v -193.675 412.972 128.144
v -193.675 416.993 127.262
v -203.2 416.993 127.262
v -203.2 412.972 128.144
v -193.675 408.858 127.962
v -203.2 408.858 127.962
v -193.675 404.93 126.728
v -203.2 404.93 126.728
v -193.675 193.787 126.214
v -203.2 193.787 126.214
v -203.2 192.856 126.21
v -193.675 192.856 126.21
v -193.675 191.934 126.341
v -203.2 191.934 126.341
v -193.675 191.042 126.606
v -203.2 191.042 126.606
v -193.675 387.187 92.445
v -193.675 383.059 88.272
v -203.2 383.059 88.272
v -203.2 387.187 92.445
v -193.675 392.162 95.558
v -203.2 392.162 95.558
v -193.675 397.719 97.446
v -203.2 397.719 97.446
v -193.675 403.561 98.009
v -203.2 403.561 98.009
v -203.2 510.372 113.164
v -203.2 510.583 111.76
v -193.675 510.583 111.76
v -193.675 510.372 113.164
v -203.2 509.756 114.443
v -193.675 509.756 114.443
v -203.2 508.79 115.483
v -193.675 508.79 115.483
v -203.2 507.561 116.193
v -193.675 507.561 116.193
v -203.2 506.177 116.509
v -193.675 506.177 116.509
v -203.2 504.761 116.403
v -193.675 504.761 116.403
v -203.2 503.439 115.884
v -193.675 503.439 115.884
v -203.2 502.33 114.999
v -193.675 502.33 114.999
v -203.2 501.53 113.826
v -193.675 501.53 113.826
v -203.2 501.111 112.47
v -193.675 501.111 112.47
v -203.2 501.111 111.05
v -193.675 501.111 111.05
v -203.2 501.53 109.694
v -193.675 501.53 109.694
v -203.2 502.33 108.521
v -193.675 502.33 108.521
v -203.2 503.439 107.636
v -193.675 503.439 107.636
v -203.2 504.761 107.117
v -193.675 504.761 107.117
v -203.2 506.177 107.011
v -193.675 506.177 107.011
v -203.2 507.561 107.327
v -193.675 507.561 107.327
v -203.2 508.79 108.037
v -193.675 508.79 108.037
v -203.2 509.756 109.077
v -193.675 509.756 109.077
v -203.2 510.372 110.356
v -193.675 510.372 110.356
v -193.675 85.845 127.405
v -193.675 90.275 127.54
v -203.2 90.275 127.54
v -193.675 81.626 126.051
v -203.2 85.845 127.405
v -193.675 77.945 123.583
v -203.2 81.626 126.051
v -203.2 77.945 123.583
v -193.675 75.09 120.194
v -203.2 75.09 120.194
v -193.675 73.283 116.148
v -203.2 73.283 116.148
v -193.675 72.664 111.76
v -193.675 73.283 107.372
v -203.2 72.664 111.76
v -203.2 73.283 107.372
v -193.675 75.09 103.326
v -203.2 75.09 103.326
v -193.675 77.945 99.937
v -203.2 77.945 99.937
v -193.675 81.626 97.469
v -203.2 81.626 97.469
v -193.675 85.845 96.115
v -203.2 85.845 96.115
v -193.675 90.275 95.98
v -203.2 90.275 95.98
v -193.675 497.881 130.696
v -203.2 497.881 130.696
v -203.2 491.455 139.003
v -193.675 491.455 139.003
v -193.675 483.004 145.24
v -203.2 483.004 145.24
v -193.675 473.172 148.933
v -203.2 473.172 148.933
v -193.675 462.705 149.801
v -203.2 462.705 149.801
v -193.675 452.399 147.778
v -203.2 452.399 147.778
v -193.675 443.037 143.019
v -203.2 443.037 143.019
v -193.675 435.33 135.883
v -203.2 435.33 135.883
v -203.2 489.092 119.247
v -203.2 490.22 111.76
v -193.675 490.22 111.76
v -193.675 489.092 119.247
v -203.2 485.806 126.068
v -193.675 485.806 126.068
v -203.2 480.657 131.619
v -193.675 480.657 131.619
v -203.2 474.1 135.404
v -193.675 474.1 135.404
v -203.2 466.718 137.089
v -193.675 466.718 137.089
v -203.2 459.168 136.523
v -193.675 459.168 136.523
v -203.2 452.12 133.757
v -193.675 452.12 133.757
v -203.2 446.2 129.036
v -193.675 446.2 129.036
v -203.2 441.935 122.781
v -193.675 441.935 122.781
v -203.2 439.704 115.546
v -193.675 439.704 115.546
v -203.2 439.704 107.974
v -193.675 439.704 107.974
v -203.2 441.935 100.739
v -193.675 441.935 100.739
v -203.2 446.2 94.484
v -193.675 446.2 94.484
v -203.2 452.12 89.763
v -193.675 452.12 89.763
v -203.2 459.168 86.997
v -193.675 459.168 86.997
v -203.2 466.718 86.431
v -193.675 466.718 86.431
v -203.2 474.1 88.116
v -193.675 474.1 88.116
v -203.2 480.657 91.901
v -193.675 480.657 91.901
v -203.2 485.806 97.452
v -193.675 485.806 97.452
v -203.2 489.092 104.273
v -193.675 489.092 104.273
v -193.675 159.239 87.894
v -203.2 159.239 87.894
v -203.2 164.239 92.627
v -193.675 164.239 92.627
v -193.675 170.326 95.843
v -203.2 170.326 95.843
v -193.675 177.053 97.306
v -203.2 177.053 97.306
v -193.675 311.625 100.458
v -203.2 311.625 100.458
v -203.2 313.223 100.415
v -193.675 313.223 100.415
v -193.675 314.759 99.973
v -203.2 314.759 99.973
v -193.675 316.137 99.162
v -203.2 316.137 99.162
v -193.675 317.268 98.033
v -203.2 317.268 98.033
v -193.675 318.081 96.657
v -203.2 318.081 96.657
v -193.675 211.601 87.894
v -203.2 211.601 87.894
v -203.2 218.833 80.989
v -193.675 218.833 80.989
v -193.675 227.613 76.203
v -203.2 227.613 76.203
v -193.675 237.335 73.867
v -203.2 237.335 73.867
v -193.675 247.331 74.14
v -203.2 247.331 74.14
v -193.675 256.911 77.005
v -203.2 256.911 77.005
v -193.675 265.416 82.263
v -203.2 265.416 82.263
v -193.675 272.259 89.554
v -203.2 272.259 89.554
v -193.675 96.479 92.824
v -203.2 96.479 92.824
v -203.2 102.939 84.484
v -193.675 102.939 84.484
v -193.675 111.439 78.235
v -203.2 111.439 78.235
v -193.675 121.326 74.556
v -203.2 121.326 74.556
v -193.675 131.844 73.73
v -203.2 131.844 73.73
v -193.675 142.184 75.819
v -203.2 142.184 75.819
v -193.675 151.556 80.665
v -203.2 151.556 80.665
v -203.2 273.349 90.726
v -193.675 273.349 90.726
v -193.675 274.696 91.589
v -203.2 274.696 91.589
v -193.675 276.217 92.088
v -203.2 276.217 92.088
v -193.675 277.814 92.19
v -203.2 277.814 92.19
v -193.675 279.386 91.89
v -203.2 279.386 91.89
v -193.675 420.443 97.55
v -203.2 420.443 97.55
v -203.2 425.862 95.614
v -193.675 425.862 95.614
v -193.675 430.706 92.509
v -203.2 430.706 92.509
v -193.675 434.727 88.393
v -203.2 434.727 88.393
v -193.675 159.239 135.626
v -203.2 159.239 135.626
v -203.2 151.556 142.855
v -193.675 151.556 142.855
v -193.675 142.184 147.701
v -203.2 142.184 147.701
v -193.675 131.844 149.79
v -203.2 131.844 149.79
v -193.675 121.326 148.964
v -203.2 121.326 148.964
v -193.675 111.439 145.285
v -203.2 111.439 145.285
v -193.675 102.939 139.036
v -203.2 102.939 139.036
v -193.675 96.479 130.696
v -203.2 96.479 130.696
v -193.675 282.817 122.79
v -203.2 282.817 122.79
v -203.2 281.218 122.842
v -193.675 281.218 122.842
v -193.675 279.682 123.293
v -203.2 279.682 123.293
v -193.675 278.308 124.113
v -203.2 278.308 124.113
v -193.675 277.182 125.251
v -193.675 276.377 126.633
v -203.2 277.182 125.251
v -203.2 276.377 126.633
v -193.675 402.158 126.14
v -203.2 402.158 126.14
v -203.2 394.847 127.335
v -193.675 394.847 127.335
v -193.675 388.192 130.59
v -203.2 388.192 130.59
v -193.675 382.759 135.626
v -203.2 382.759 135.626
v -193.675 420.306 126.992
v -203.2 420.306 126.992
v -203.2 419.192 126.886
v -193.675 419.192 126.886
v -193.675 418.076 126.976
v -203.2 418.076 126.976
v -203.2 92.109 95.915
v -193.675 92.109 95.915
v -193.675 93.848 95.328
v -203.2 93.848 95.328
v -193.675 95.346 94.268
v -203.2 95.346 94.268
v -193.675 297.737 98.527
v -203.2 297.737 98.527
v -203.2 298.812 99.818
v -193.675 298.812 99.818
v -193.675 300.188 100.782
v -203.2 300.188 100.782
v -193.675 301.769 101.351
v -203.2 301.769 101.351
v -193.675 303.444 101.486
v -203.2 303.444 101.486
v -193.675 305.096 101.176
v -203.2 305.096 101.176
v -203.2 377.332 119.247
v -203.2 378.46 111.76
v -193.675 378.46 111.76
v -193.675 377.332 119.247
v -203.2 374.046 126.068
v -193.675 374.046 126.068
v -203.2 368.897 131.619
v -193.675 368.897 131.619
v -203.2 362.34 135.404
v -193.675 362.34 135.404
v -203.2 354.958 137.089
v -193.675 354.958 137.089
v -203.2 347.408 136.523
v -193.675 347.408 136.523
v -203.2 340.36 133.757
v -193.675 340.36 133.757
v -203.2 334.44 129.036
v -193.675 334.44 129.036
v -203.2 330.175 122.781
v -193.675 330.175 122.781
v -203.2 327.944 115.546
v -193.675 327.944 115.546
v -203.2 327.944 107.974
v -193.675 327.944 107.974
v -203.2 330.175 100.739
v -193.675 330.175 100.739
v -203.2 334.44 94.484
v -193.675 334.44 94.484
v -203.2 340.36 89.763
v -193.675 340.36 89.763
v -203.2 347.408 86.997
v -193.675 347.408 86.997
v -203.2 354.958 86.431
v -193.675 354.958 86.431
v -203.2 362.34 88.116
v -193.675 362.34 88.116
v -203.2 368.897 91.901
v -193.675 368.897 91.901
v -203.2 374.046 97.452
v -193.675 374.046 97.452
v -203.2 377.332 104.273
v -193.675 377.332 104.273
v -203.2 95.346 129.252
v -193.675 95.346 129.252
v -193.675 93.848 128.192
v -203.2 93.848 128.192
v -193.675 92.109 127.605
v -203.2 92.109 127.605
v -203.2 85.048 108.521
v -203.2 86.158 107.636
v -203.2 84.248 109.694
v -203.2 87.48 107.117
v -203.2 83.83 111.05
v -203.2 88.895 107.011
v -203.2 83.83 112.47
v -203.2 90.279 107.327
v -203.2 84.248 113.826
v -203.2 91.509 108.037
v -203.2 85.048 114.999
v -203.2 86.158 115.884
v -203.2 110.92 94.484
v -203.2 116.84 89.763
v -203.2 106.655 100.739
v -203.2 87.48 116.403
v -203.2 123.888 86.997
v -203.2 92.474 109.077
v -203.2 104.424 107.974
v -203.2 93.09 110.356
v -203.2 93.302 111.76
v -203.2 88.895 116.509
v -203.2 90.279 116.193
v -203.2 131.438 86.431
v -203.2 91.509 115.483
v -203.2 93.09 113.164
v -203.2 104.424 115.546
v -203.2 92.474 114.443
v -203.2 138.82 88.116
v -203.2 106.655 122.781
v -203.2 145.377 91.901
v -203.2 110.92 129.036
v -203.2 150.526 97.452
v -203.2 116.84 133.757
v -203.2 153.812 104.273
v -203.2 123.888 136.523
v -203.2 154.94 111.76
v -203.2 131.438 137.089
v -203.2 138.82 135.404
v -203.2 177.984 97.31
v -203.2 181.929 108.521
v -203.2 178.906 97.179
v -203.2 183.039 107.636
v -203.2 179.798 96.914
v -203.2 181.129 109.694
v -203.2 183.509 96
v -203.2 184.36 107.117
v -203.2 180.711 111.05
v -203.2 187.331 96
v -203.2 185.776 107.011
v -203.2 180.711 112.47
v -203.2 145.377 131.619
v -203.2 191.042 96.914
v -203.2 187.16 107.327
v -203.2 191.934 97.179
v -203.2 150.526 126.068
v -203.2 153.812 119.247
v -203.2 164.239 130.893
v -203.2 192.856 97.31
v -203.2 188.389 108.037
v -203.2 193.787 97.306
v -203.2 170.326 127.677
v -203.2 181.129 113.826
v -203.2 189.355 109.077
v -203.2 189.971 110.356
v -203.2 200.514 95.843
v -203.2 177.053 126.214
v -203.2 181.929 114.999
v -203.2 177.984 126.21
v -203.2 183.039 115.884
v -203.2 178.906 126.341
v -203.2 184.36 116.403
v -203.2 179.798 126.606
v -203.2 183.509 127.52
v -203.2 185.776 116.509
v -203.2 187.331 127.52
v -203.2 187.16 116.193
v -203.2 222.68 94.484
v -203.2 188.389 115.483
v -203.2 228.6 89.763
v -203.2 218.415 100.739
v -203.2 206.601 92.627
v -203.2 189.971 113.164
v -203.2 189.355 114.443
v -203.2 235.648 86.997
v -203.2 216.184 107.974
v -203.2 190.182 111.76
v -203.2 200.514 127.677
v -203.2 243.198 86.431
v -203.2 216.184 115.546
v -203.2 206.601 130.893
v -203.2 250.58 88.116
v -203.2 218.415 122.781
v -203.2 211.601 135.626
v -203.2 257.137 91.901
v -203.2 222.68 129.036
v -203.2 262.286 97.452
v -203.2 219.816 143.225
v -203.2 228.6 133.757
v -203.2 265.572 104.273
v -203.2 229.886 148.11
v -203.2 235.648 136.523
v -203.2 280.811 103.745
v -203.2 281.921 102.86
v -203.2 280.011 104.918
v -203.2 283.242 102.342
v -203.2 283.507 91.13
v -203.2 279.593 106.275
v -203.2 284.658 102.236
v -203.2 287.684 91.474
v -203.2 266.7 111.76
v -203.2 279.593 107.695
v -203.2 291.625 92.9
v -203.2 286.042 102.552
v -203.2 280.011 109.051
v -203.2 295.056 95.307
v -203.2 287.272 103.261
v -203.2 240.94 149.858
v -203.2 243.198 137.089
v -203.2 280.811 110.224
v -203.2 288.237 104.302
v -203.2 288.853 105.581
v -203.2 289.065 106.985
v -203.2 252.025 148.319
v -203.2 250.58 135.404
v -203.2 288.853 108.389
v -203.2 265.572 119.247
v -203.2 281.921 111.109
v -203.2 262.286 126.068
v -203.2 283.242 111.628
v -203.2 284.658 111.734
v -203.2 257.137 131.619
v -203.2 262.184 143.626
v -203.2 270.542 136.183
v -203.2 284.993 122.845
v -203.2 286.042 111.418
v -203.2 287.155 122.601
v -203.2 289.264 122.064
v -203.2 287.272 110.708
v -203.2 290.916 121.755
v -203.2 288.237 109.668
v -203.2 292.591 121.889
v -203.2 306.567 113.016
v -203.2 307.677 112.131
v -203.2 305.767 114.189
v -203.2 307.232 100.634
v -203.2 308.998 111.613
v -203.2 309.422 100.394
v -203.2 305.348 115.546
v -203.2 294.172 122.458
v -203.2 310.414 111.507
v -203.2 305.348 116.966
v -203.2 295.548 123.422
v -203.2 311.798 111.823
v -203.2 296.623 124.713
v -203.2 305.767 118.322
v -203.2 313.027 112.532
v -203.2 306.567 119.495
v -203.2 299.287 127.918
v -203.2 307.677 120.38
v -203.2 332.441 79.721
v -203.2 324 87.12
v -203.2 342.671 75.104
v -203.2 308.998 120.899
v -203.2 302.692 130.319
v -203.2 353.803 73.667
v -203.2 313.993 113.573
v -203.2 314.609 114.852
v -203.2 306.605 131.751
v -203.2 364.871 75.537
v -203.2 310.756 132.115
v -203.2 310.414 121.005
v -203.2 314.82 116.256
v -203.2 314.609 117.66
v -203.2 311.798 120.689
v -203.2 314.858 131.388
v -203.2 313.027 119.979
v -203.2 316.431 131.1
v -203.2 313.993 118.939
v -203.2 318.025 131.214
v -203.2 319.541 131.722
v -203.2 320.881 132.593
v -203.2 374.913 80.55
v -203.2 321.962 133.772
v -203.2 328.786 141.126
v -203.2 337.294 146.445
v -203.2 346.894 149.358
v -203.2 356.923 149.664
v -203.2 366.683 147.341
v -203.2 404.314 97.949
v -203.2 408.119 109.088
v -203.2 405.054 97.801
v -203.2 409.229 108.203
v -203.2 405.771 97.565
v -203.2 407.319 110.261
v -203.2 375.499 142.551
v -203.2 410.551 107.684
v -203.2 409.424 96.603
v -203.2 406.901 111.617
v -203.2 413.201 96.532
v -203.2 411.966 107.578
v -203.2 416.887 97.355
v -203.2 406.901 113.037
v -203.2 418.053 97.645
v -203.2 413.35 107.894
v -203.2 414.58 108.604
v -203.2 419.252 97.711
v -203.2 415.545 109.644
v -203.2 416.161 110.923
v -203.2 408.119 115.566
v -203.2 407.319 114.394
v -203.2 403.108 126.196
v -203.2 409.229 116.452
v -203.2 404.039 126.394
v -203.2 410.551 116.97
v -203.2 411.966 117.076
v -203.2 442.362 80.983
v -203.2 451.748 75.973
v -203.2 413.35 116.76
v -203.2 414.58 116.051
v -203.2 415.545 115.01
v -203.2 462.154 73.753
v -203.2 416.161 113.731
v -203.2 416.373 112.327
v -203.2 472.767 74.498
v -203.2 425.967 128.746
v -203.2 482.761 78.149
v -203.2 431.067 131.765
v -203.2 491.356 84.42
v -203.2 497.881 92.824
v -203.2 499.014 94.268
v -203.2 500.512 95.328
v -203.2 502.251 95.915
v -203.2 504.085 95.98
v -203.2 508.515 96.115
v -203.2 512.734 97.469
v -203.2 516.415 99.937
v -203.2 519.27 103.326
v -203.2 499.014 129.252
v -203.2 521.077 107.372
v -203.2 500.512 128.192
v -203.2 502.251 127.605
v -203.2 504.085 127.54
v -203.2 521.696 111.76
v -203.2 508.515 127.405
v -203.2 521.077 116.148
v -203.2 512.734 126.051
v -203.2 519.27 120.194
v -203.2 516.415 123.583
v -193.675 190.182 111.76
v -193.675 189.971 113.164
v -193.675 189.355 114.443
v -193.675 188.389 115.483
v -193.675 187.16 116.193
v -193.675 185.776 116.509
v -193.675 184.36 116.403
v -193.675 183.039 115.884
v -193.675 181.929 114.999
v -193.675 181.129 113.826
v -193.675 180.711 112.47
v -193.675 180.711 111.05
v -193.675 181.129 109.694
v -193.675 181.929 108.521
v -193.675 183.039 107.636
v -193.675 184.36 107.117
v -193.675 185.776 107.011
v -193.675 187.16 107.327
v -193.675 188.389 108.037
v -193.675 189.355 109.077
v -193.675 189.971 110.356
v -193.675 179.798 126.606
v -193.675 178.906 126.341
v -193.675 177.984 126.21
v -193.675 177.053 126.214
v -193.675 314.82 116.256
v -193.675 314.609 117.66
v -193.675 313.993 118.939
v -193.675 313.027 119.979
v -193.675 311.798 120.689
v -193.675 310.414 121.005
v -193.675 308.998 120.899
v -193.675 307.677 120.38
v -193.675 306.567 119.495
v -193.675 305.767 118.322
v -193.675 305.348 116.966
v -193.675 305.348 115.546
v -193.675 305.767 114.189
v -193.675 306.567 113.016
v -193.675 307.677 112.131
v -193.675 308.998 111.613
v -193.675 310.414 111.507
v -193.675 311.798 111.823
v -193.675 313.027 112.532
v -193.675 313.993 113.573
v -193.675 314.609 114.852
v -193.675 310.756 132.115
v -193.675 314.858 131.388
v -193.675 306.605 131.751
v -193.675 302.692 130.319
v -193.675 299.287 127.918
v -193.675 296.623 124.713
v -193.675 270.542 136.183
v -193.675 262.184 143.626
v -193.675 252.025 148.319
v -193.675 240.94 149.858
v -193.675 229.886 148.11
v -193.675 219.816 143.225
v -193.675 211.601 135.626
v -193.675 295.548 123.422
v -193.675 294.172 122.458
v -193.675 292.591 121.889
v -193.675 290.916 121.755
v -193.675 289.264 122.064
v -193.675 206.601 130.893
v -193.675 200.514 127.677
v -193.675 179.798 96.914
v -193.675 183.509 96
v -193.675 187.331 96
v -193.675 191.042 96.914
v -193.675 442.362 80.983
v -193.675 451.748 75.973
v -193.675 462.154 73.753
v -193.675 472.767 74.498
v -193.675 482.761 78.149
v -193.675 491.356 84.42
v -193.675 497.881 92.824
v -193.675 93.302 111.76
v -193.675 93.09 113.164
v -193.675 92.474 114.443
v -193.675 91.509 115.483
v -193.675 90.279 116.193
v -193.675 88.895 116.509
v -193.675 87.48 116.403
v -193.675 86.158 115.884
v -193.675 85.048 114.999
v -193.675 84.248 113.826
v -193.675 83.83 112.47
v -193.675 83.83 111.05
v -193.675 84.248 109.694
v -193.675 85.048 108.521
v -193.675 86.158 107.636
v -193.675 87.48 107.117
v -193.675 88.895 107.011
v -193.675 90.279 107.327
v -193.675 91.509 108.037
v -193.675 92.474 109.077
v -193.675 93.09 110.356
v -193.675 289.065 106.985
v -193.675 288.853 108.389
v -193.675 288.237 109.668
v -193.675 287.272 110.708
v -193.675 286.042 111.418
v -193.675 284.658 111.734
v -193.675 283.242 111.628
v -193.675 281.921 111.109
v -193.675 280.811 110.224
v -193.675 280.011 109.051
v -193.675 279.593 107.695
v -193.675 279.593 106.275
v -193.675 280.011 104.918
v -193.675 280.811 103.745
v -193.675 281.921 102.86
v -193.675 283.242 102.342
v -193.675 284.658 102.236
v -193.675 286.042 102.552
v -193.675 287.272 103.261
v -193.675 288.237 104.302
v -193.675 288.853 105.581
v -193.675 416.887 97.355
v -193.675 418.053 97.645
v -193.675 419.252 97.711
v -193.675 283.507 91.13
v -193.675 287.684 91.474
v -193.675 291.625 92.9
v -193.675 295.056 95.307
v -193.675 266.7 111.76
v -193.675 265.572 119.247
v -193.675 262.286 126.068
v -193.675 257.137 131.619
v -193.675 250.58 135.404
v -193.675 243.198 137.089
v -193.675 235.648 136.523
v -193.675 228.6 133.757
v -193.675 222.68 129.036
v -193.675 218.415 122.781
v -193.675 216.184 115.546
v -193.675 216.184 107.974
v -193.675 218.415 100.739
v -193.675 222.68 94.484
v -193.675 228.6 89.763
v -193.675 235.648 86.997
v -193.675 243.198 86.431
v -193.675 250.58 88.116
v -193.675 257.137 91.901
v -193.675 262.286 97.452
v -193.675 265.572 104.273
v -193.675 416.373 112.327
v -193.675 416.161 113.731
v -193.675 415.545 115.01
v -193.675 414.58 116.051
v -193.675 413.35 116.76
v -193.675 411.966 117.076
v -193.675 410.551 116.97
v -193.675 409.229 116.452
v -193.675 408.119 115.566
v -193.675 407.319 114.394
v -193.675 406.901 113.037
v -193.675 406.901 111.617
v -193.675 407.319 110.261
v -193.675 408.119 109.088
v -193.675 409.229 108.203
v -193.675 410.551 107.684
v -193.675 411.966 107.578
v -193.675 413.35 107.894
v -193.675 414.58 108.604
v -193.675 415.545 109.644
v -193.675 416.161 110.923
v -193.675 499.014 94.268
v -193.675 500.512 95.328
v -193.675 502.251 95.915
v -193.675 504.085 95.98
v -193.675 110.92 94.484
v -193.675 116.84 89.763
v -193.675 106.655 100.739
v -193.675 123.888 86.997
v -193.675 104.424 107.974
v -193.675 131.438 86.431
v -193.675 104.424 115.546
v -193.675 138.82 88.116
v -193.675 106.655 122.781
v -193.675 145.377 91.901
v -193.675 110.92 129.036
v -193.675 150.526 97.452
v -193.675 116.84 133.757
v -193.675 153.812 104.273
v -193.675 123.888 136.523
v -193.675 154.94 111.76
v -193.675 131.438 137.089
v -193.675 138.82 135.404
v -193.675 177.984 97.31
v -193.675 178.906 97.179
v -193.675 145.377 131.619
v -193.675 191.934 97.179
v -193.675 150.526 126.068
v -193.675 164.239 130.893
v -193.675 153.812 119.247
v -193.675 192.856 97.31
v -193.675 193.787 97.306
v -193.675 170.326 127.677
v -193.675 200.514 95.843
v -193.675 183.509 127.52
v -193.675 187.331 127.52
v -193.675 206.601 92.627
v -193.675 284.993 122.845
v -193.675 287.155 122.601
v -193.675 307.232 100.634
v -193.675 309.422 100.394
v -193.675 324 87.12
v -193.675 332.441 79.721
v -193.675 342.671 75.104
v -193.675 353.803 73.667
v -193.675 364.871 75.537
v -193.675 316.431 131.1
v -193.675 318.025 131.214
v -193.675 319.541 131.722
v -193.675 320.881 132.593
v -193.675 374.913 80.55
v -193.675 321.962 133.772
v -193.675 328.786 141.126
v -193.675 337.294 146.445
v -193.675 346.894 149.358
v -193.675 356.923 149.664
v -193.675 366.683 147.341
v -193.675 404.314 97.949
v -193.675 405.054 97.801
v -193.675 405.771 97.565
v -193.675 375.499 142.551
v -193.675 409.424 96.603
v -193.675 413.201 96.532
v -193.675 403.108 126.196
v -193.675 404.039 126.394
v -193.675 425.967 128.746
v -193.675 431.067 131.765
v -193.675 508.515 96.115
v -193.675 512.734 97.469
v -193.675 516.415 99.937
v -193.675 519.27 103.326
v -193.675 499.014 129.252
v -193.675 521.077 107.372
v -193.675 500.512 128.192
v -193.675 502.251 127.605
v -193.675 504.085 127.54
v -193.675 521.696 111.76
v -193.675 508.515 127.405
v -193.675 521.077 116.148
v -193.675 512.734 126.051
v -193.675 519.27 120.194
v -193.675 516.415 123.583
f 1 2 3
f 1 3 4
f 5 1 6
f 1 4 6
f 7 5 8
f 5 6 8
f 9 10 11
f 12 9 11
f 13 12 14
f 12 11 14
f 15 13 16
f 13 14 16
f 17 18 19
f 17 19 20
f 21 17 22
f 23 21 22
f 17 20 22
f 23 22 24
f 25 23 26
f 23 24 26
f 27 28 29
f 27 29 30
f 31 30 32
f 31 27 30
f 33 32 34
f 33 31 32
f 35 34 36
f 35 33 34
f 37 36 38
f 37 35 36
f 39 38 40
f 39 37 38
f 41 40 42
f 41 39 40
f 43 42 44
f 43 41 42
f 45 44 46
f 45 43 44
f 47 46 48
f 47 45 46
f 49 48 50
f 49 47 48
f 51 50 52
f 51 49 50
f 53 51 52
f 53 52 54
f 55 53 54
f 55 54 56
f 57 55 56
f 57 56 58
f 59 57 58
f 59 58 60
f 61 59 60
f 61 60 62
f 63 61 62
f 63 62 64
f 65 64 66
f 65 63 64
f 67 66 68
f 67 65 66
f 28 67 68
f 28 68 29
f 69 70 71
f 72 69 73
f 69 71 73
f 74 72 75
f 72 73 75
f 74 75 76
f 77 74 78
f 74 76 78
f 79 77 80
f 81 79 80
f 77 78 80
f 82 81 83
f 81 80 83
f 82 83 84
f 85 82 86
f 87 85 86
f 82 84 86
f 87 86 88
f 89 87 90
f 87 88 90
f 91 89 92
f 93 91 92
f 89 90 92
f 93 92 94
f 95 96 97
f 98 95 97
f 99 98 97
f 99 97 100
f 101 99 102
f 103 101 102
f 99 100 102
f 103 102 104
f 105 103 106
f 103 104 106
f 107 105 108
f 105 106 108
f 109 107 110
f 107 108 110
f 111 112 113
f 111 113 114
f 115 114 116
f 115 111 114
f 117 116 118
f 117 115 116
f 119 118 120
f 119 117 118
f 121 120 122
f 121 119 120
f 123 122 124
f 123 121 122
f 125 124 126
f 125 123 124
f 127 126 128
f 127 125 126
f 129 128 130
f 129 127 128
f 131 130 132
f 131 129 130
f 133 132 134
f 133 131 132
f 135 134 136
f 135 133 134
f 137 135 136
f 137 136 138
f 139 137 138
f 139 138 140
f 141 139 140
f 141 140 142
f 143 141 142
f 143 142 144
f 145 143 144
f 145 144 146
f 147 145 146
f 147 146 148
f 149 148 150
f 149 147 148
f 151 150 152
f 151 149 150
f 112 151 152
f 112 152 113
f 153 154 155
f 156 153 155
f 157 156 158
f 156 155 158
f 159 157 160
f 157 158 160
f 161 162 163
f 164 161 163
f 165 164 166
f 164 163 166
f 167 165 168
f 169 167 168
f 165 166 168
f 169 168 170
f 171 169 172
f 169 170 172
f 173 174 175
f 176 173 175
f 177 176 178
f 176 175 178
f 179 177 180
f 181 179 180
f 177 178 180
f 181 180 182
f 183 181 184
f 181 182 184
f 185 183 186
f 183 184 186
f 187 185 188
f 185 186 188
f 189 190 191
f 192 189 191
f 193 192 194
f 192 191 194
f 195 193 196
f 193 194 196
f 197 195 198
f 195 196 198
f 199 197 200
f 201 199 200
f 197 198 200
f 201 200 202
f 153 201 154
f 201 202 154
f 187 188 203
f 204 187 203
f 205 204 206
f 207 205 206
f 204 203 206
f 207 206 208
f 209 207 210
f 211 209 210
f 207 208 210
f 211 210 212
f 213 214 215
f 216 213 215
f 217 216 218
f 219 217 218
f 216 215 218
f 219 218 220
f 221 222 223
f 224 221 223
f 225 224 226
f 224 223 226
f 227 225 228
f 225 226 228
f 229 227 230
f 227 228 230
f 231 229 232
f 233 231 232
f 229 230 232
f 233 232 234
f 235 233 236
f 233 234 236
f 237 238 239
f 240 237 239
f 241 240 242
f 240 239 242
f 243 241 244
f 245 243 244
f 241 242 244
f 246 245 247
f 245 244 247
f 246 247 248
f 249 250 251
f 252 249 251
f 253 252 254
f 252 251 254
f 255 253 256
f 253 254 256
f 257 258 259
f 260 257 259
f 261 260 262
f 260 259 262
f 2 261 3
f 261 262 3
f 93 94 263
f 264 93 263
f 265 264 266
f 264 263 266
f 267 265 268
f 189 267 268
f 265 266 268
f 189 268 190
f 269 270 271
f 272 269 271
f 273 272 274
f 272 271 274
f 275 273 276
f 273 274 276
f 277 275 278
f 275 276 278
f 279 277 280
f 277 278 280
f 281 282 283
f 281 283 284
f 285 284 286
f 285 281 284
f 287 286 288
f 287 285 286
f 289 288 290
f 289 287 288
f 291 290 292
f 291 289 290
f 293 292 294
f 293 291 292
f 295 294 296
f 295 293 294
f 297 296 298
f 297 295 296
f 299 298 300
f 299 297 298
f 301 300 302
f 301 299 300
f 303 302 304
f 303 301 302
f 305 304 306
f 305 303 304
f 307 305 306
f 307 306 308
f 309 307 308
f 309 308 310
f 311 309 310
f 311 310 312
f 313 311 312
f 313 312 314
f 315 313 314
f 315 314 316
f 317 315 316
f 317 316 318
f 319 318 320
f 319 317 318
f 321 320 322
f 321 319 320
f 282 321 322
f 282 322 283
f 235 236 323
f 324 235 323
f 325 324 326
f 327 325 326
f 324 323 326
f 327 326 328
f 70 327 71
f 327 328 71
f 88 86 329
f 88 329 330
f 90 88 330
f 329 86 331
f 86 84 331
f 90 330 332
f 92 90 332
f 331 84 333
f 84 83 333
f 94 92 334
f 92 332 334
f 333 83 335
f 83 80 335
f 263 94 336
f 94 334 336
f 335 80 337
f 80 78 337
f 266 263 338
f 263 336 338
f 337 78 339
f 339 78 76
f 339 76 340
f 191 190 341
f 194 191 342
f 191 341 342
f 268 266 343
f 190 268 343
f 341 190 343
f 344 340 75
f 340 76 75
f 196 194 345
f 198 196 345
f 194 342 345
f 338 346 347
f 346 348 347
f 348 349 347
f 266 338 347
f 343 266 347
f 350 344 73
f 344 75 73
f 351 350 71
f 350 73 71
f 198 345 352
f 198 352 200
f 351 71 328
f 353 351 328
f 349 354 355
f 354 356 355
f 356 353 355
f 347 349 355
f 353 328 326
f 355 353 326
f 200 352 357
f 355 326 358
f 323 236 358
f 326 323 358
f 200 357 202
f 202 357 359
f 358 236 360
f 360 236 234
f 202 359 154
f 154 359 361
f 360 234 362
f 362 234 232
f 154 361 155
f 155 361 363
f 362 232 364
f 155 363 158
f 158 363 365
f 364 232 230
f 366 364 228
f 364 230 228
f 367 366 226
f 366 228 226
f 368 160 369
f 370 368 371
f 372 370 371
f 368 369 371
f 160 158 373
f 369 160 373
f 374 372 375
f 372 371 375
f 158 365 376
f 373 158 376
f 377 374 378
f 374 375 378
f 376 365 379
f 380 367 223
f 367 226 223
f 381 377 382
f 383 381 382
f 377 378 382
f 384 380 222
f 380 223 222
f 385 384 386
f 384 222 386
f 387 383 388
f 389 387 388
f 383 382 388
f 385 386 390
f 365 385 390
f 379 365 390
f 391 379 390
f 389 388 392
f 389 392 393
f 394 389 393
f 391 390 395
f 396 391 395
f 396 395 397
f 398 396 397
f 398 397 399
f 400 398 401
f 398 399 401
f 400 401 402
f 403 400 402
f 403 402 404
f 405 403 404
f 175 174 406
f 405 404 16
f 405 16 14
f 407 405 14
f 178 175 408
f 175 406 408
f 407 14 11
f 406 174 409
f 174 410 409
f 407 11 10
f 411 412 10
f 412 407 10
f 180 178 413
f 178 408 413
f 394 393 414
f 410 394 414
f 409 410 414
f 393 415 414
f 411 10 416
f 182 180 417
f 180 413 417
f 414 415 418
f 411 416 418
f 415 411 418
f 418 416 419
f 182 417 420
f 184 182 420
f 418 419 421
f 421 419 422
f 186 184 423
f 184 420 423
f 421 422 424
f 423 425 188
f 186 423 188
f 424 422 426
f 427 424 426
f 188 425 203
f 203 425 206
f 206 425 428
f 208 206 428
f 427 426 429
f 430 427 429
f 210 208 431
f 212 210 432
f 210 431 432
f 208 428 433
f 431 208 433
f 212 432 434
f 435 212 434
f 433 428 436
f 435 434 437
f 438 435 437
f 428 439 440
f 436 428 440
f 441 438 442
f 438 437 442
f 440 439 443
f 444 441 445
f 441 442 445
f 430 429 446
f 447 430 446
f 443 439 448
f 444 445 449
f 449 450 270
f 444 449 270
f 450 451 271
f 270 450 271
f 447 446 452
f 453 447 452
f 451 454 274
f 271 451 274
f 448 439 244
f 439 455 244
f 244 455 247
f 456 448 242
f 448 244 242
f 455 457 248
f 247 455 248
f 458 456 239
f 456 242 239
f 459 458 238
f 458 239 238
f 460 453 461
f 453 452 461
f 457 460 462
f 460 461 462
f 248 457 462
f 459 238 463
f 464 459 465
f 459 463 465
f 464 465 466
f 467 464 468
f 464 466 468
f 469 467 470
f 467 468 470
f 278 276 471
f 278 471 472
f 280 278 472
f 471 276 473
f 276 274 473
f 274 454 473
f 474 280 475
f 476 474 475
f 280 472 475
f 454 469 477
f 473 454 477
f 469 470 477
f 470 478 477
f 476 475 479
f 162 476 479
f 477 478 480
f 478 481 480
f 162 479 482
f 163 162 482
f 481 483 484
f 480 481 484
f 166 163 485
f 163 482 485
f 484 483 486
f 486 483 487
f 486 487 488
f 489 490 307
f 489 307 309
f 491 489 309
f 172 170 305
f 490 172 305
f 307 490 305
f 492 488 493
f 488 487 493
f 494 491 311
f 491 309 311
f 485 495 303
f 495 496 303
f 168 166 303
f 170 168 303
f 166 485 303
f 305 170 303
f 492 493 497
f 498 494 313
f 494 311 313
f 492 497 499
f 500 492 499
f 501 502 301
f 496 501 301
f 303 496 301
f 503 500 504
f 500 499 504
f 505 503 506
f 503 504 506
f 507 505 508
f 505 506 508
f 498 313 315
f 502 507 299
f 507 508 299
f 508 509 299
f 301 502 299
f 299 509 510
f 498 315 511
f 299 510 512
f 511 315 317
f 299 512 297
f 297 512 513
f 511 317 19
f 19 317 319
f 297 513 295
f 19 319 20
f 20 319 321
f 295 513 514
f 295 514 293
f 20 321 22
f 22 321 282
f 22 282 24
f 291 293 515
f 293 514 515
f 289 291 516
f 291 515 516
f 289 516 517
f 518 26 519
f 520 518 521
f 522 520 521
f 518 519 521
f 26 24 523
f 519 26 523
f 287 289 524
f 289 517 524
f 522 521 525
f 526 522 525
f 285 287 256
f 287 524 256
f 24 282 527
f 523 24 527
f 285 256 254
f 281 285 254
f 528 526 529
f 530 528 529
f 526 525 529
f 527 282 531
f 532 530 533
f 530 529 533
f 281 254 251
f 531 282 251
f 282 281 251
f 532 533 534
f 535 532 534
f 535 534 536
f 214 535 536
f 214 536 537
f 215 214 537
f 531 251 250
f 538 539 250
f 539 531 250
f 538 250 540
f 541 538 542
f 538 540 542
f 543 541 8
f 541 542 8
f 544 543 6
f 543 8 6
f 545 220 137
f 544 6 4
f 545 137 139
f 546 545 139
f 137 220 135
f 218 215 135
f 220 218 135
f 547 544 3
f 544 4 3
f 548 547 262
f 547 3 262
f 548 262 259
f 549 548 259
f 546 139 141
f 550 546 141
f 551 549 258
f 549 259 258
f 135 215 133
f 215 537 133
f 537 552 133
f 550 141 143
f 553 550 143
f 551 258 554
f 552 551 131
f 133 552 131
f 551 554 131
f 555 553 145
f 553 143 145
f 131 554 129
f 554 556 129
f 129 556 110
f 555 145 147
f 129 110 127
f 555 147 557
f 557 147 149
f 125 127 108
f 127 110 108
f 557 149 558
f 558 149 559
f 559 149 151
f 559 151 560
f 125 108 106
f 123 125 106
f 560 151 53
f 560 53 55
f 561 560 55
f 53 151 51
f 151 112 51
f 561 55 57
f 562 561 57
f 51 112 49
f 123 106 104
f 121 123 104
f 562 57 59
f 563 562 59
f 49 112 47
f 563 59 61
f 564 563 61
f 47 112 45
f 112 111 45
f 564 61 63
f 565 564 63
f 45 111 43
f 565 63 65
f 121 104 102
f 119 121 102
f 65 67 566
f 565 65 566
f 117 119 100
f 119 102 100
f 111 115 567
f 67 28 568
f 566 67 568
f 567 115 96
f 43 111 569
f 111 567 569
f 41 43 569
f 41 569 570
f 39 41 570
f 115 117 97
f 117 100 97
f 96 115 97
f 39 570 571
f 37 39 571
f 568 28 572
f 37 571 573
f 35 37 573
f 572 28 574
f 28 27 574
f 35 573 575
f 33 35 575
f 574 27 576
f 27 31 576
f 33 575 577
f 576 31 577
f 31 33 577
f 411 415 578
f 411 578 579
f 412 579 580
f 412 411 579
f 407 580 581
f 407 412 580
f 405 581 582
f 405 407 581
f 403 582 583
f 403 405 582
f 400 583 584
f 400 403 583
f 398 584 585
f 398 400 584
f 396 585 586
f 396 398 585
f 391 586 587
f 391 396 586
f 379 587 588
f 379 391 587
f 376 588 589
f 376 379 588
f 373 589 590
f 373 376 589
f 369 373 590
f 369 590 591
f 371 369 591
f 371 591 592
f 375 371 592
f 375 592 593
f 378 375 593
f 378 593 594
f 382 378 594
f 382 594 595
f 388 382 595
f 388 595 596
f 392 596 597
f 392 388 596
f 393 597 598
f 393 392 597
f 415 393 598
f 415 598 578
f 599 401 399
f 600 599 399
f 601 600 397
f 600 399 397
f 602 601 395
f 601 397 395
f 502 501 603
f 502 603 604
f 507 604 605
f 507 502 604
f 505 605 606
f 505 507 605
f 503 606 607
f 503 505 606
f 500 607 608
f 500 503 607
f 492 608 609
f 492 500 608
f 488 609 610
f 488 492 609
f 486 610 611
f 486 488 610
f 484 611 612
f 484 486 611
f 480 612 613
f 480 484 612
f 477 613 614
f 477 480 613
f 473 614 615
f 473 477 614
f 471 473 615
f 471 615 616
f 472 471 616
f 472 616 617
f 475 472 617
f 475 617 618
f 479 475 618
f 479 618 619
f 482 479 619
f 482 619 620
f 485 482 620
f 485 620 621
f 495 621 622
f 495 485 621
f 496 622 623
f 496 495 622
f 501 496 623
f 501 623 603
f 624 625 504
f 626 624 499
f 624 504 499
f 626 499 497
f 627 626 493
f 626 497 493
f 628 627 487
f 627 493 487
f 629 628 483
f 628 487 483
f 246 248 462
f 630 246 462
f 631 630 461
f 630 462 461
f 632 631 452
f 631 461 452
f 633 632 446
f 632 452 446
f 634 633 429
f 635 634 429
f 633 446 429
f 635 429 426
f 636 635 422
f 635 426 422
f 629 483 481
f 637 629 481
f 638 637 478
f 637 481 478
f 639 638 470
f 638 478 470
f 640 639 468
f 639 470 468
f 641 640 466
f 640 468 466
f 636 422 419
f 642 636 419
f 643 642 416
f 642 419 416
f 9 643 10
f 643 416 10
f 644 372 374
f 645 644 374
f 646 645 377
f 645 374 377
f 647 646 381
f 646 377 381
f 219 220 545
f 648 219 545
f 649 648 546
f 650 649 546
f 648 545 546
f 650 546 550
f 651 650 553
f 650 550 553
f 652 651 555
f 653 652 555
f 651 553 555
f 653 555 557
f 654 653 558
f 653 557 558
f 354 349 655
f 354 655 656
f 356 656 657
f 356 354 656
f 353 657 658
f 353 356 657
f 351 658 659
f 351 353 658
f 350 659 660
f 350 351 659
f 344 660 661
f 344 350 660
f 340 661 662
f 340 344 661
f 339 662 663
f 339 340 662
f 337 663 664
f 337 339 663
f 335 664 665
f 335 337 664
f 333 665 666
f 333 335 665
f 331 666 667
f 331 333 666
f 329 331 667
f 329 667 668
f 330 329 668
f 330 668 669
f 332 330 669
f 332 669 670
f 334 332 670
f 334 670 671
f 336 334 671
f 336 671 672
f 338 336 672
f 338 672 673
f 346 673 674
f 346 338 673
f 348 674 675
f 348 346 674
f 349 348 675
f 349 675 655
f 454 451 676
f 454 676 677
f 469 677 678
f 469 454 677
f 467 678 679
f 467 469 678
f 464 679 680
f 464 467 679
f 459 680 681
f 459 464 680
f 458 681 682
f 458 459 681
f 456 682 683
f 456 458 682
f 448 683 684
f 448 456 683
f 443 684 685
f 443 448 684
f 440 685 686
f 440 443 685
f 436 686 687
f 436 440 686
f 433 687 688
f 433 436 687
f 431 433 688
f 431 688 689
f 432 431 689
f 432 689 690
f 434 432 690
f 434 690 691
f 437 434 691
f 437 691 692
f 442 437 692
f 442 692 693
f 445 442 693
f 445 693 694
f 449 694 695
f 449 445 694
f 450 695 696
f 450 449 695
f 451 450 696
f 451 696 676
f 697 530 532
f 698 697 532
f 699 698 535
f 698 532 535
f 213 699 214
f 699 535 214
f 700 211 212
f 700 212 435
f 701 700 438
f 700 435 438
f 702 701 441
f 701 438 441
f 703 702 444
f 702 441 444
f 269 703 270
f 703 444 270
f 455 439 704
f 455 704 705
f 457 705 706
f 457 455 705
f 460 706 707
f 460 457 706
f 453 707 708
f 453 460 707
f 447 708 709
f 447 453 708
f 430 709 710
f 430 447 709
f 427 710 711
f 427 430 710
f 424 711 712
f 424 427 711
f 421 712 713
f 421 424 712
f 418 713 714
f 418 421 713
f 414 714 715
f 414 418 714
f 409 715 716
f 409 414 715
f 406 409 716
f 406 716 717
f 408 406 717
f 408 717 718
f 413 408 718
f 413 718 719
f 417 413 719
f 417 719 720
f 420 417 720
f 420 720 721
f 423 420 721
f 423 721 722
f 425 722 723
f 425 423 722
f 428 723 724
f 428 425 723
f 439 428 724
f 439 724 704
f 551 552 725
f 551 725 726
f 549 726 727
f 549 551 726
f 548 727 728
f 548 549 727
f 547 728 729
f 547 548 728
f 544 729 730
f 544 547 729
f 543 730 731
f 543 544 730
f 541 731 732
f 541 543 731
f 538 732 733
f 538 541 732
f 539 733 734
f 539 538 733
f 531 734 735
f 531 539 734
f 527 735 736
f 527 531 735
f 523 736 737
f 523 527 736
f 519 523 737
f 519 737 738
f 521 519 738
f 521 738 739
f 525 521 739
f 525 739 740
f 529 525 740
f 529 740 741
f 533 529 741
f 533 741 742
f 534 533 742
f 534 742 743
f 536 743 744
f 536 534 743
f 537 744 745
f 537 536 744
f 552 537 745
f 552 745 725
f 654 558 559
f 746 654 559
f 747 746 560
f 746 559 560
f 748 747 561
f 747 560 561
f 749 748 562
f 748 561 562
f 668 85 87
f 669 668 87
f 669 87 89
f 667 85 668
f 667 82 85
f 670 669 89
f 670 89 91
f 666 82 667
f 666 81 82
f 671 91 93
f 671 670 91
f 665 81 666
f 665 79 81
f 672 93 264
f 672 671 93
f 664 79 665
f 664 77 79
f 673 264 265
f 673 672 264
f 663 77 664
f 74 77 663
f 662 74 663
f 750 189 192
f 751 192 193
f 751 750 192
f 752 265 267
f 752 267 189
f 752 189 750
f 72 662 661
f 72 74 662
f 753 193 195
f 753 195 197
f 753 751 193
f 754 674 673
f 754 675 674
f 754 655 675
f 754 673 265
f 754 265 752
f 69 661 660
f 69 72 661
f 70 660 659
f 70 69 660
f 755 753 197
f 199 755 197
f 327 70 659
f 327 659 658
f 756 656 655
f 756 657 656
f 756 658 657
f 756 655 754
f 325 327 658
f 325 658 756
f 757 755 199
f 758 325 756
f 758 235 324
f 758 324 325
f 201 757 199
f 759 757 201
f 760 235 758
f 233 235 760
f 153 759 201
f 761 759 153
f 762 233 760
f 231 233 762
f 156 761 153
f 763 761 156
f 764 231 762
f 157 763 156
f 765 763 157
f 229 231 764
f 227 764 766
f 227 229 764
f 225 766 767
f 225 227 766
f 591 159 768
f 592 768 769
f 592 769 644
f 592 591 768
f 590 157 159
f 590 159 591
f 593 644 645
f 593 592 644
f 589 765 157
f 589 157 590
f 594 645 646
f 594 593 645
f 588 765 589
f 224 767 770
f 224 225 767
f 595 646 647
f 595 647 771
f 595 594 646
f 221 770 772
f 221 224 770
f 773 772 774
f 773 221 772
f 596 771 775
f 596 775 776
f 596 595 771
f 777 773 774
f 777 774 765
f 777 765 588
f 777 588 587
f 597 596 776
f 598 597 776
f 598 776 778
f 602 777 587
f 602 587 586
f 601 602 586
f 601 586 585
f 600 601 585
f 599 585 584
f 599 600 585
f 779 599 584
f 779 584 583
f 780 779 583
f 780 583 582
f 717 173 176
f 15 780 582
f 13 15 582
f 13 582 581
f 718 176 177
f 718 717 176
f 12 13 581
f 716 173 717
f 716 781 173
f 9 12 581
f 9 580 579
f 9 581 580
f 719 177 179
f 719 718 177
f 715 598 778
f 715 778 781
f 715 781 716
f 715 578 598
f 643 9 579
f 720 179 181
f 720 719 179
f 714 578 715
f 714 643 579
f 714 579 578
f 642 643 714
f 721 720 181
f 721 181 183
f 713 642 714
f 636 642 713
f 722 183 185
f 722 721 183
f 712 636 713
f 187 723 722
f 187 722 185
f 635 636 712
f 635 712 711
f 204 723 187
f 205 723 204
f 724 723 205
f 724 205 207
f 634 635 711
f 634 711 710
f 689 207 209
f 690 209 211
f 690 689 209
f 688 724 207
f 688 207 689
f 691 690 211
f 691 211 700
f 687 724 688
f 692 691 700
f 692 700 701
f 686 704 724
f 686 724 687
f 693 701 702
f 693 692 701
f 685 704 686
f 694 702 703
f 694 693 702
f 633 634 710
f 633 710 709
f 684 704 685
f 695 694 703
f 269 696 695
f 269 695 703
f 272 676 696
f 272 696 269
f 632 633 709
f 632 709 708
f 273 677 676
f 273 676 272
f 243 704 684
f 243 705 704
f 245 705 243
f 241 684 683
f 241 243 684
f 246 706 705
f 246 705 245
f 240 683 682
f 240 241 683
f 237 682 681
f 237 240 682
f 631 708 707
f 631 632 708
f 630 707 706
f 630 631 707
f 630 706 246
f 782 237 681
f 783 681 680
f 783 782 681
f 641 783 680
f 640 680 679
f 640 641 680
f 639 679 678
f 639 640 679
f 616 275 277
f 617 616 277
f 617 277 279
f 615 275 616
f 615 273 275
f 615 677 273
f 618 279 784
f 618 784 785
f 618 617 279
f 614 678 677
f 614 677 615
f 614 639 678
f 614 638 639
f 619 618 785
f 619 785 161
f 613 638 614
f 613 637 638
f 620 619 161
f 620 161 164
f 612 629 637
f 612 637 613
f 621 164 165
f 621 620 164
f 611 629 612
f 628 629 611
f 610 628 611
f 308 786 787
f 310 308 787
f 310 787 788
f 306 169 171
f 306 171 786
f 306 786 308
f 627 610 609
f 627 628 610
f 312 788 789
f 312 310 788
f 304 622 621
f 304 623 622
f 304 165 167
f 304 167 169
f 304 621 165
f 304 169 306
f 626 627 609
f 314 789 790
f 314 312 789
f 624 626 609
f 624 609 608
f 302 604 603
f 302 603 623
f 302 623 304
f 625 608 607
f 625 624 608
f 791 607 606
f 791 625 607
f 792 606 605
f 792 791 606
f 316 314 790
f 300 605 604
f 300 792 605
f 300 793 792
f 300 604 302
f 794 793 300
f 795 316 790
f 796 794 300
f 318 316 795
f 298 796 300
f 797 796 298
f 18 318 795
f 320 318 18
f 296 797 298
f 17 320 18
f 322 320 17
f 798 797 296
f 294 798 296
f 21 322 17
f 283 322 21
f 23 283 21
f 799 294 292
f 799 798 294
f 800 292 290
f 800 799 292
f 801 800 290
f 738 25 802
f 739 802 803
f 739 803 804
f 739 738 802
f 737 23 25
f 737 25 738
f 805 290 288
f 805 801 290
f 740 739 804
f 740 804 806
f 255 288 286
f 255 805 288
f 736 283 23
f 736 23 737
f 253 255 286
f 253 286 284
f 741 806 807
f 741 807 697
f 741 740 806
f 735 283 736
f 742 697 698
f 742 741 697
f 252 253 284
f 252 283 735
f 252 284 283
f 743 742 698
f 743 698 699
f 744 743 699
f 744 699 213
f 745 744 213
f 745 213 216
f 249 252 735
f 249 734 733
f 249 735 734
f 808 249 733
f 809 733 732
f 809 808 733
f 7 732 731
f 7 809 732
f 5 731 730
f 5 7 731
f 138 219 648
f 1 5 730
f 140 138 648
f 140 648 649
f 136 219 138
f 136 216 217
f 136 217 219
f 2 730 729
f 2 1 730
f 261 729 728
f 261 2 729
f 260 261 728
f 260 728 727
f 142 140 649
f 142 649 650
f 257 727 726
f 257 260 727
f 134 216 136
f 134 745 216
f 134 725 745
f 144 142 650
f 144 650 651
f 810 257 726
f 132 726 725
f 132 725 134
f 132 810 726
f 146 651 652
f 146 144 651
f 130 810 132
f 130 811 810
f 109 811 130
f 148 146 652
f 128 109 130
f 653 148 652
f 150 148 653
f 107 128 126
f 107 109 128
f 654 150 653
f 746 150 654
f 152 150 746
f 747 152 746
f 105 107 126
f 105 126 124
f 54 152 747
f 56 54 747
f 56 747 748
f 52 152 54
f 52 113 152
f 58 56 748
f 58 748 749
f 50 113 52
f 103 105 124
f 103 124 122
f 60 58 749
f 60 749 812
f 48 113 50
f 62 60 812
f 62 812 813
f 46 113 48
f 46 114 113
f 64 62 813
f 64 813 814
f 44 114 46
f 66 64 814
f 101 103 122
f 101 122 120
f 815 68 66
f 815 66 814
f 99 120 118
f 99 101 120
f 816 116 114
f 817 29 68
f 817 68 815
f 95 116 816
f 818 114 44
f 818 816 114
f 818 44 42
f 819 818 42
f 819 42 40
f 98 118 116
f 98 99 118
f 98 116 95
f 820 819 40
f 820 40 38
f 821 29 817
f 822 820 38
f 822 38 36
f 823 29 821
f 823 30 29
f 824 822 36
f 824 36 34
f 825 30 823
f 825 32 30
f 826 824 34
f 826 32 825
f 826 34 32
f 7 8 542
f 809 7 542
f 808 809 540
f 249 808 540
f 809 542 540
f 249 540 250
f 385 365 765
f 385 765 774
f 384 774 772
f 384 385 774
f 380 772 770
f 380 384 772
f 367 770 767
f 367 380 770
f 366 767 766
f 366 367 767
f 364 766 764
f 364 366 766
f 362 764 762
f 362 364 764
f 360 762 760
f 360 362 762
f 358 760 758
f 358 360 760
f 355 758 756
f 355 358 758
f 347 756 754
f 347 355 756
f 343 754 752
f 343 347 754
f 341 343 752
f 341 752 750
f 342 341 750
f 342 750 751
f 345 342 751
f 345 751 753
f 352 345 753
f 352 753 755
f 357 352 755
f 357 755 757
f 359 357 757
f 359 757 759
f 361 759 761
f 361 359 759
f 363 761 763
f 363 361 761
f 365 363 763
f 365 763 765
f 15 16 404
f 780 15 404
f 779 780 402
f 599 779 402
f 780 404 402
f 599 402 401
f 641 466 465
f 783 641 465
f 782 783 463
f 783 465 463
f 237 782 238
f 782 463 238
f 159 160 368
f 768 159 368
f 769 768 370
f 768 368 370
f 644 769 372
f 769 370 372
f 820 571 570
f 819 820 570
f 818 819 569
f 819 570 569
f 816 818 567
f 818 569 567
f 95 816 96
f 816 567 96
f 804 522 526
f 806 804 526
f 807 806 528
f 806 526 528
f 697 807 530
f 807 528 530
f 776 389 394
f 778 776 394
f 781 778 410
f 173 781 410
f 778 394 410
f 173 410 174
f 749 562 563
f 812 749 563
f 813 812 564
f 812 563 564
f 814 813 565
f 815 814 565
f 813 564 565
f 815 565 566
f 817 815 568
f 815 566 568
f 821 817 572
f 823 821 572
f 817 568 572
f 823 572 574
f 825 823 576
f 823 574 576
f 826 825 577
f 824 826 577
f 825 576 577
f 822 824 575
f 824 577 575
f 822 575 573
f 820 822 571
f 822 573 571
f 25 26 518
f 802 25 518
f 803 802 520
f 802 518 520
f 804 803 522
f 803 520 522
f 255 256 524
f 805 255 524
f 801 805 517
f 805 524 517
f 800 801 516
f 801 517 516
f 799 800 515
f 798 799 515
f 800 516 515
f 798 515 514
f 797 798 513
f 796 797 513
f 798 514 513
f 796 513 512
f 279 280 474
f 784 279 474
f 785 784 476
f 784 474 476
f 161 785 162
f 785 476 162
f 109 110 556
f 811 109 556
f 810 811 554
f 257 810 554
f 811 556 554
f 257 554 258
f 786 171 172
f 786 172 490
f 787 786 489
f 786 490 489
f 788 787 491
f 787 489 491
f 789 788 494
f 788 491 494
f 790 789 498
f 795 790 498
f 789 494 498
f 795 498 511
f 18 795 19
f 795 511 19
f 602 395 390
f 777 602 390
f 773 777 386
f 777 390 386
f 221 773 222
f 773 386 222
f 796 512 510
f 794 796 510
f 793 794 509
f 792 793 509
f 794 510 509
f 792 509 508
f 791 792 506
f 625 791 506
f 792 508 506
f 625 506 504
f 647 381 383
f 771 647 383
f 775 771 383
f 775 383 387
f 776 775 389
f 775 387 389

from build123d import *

# Parameters (mm, degrees)
F3_R     = 4.7625
F3_R_2   = 31.75
F3_R_3   = 25.4
F8_DEPTH = 9.525


with BuildPart() as f8:
    # F3 (on offset) → F8 (new body)
    with BuildSketch(Plane.YZ.offset(-203.2)):
        with BuildLine():
            ThreePointArc((504.085483, 127.539883), (500.512376, 128.192005), (497.881204, 130.69586))
            ThreePointArc((497.881204, 130.69586), (467.968772, 149.729662), (435.329623, 135.883177))
            ThreePointArc((435.329623, 135.883177), (428.605586, 130.10633), (420.305835, 126.992045))
            ThreePointArc((420.305835, 126.992045), (418.631702, 126.906277), (416.99346, 127.261584))
            ThreePointArc((416.99346, 127.261584), (410.909202, 128.18666), (404.930309, 126.728302))
            ThreePointArc((404.930309, 126.728302), (403.577562, 126.277317), (402.15829, 126.139551))
            ThreePointArc((402.15829, 126.139551), (391.400337, 128.718459), (382.759018, 135.62584))
            ThreePointArc((382.759018, 135.62584), (351.898546, 149.842293), (321.961786, 133.771613))
            ThreePointArc((321.961786, 133.771613), (318.79924, 131.420238), (314.858479, 131.387525))
            ThreePointArc((314.858479, 131.387525), (304.601343, 131.163607), (296.623197, 124.713168))
            ThreePointArc((296.623197, 124.713168), (293.400016, 122.121405), (289.264455, 122.064311))
            ThreePointArc((289.264455, 122.064311), (286.078264, 122.760136), (282.817118, 122.790184))
            ThreePointArc((282.817118, 122.790184), (278.969036, 123.659479), (276.37693, 126.633432))
            ThreePointArc((276.37693, 126.633432), (246.538925, 149.498093), (211.600982, 135.62584))
            ThreePointArc((211.600982, 135.62584), (203.667081, 129.078189), (193.787021, 126.214112))
            ThreePointArc((193.787021, 126.214112), (192.392802, 126.258483), (191.041911, 126.606203))
            ThreePointArc((191.041911, 126.606203), (185.42, 127.635), (179.798089, 126.606203))
            ThreePointArc((179.798089, 126.606203), (178.447198, 126.258483), (177.052979, 126.214112))
            ThreePointArc((177.052979, 126.214112), (167.172919, 129.078189), (159.239018, 135.62584))
            ThreePointArc((159.239018, 135.62584), (126.556336, 149.742993), (96.478796, 130.69586))
            ThreePointArc((96.478796, 130.69586), (93.847624, 128.192005), (90.274517, 127.539883))
            ThreePointArc((90.274517, 127.539883), (72.66432, 111.76), (90.274517, 95.980117))
            ThreePointArc((90.274517, 95.980117), (93.847624, 95.327995), (96.478796, 92.82414))
            ThreePointArc((96.478796, 92.82414), (126.556336, 73.777007), (159.239018, 87.89416))
            ThreePointArc((159.239018, 87.89416), (167.172919, 94.441811), (177.052979, 97.305888))
            ThreePointArc((177.052979, 97.305888), (178.447198, 97.261517), (179.798089, 96.913797))
            ThreePointArc((179.798089, 96.913797), (185.42, 95.885), (191.041911, 96.913797))
            ThreePointArc((191.041911, 96.913797), (192.392802, 97.261517), (193.787021, 97.305888))
            ThreePointArc((193.787021, 97.305888), (203.667081, 94.441811), (211.600982, 87.89416))
            ThreePointArc((211.600982, 87.89416), (242.341876, 73.674248), (272.259375, 89.553535))
            ThreePointArc((272.259375, 89.553535), (275.440775, 91.886366), (279.385822, 91.890269))
            ThreePointArc((279.385822, 91.890269), (289.701554, 92.056216), (297.736803, 98.527432))
            ThreePointArc((297.736803, 98.527432), (300.959984, 101.119195), (305.095545, 101.176289))
            ThreePointArc((305.095545, 101.176289), (308.322678, 100.475909), (311.62489, 100.458336))
            ThreePointArc((311.62489, 100.458336), (315.473668, 99.611242), (318.081479, 96.656587))
            ThreePointArc((318.081479, 96.656587), (348.184283, 73.973264), (383.059023, 88.272373))
            ThreePointArc((383.059023, 88.272373), (392.162049, 95.558021), (403.56111, 98.008978))
            ThreePointArc((403.56111, 98.008978), (404.685964, 97.885867), (405.771107, 97.565059))
            ThreePointArc((405.771107, 97.565059), (411.310239, 96.454986), (416.887372, 97.3549))
            ThreePointArc((416.887372, 97.3549), (418.651149, 97.706509), (420.442765, 97.549504))
            ThreePointArc((420.442765, 97.549504), (428.371848, 94.199323), (434.726695, 88.393293))
            ThreePointArc((434.726695, 88.393293), (467.486497, 73.753424), (497.881204, 92.82414))
            ThreePointArc((497.881204, 92.82414), (500.512376, 95.327995), (504.085483, 95.980117))
            ThreePointArc((504.085483, 95.980117), (521.69568, 111.76), (504.085483, 127.539883))
        make_face()
        with Locations((88.53932, 111.76)):
            Circle(F3_R, mode=Mode.SUBTRACT)
        with Locations((129.54, 111.76)):
            Circle(F3_R_2, mode=Mode.SUBTRACT)
        with Locations((185.42, 111.76)):
            Circle(F3_R, mode=Mode.SUBTRACT)
        with Locations((284.3022, 106.9848)):
            Circle(F3_R, mode=Mode.SUBTRACT)
        with Locations((241.3, 111.76)):
            Circle(F3_R_2, mode=Mode.SUBTRACT)
        with Locations((353.06, 111.76)):
            Circle(F3_R_2, mode=Mode.SUBTRACT)
        with Locations((464.82, 111.76)):
            Circle(F3_R_2, mode=Mode.SUBTRACT)
        with Locations((505.82068, 111.76)):
            Circle(F3_R, mode=Mode.SUBTRACT)
        with Locations((310.0578, 116.2558)):
            Circle(F3_R, mode=Mode.SUBTRACT)
        with Locations((411.610311, 112.327149)):
            Circle(F3_R, mode=Mode.SUBTRACT)
        with Locations((129.54, 111.76)):
            Circle(F3_R_2)
        with Locations((129.54, 111.76)):
            Circle(F3_R_3, mode=Mode.SUBTRACT)
        with Locations((241.3, 111.76)):
            Circle(F3_R_2)
        with Locations((241.3, 111.76)):
            Circle(F3_R_3, mode=Mode.SUBTRACT)
        with Locations((353.06, 111.76)):
            Circle(F3_R_2)
        with Locations((353.06, 111.76)):
            Circle(F3_R_3, mode=Mode.SUBTRACT)
        with Locations((464.82, 111.76)):
            Circle(F3_R_2)
        with Locations((464.82, 111.76)):
            Circle(F3_R_3, mode=Mode.SUBTRACT)
    extrude(amount=F8_DEPTH)


solid = f8.part
